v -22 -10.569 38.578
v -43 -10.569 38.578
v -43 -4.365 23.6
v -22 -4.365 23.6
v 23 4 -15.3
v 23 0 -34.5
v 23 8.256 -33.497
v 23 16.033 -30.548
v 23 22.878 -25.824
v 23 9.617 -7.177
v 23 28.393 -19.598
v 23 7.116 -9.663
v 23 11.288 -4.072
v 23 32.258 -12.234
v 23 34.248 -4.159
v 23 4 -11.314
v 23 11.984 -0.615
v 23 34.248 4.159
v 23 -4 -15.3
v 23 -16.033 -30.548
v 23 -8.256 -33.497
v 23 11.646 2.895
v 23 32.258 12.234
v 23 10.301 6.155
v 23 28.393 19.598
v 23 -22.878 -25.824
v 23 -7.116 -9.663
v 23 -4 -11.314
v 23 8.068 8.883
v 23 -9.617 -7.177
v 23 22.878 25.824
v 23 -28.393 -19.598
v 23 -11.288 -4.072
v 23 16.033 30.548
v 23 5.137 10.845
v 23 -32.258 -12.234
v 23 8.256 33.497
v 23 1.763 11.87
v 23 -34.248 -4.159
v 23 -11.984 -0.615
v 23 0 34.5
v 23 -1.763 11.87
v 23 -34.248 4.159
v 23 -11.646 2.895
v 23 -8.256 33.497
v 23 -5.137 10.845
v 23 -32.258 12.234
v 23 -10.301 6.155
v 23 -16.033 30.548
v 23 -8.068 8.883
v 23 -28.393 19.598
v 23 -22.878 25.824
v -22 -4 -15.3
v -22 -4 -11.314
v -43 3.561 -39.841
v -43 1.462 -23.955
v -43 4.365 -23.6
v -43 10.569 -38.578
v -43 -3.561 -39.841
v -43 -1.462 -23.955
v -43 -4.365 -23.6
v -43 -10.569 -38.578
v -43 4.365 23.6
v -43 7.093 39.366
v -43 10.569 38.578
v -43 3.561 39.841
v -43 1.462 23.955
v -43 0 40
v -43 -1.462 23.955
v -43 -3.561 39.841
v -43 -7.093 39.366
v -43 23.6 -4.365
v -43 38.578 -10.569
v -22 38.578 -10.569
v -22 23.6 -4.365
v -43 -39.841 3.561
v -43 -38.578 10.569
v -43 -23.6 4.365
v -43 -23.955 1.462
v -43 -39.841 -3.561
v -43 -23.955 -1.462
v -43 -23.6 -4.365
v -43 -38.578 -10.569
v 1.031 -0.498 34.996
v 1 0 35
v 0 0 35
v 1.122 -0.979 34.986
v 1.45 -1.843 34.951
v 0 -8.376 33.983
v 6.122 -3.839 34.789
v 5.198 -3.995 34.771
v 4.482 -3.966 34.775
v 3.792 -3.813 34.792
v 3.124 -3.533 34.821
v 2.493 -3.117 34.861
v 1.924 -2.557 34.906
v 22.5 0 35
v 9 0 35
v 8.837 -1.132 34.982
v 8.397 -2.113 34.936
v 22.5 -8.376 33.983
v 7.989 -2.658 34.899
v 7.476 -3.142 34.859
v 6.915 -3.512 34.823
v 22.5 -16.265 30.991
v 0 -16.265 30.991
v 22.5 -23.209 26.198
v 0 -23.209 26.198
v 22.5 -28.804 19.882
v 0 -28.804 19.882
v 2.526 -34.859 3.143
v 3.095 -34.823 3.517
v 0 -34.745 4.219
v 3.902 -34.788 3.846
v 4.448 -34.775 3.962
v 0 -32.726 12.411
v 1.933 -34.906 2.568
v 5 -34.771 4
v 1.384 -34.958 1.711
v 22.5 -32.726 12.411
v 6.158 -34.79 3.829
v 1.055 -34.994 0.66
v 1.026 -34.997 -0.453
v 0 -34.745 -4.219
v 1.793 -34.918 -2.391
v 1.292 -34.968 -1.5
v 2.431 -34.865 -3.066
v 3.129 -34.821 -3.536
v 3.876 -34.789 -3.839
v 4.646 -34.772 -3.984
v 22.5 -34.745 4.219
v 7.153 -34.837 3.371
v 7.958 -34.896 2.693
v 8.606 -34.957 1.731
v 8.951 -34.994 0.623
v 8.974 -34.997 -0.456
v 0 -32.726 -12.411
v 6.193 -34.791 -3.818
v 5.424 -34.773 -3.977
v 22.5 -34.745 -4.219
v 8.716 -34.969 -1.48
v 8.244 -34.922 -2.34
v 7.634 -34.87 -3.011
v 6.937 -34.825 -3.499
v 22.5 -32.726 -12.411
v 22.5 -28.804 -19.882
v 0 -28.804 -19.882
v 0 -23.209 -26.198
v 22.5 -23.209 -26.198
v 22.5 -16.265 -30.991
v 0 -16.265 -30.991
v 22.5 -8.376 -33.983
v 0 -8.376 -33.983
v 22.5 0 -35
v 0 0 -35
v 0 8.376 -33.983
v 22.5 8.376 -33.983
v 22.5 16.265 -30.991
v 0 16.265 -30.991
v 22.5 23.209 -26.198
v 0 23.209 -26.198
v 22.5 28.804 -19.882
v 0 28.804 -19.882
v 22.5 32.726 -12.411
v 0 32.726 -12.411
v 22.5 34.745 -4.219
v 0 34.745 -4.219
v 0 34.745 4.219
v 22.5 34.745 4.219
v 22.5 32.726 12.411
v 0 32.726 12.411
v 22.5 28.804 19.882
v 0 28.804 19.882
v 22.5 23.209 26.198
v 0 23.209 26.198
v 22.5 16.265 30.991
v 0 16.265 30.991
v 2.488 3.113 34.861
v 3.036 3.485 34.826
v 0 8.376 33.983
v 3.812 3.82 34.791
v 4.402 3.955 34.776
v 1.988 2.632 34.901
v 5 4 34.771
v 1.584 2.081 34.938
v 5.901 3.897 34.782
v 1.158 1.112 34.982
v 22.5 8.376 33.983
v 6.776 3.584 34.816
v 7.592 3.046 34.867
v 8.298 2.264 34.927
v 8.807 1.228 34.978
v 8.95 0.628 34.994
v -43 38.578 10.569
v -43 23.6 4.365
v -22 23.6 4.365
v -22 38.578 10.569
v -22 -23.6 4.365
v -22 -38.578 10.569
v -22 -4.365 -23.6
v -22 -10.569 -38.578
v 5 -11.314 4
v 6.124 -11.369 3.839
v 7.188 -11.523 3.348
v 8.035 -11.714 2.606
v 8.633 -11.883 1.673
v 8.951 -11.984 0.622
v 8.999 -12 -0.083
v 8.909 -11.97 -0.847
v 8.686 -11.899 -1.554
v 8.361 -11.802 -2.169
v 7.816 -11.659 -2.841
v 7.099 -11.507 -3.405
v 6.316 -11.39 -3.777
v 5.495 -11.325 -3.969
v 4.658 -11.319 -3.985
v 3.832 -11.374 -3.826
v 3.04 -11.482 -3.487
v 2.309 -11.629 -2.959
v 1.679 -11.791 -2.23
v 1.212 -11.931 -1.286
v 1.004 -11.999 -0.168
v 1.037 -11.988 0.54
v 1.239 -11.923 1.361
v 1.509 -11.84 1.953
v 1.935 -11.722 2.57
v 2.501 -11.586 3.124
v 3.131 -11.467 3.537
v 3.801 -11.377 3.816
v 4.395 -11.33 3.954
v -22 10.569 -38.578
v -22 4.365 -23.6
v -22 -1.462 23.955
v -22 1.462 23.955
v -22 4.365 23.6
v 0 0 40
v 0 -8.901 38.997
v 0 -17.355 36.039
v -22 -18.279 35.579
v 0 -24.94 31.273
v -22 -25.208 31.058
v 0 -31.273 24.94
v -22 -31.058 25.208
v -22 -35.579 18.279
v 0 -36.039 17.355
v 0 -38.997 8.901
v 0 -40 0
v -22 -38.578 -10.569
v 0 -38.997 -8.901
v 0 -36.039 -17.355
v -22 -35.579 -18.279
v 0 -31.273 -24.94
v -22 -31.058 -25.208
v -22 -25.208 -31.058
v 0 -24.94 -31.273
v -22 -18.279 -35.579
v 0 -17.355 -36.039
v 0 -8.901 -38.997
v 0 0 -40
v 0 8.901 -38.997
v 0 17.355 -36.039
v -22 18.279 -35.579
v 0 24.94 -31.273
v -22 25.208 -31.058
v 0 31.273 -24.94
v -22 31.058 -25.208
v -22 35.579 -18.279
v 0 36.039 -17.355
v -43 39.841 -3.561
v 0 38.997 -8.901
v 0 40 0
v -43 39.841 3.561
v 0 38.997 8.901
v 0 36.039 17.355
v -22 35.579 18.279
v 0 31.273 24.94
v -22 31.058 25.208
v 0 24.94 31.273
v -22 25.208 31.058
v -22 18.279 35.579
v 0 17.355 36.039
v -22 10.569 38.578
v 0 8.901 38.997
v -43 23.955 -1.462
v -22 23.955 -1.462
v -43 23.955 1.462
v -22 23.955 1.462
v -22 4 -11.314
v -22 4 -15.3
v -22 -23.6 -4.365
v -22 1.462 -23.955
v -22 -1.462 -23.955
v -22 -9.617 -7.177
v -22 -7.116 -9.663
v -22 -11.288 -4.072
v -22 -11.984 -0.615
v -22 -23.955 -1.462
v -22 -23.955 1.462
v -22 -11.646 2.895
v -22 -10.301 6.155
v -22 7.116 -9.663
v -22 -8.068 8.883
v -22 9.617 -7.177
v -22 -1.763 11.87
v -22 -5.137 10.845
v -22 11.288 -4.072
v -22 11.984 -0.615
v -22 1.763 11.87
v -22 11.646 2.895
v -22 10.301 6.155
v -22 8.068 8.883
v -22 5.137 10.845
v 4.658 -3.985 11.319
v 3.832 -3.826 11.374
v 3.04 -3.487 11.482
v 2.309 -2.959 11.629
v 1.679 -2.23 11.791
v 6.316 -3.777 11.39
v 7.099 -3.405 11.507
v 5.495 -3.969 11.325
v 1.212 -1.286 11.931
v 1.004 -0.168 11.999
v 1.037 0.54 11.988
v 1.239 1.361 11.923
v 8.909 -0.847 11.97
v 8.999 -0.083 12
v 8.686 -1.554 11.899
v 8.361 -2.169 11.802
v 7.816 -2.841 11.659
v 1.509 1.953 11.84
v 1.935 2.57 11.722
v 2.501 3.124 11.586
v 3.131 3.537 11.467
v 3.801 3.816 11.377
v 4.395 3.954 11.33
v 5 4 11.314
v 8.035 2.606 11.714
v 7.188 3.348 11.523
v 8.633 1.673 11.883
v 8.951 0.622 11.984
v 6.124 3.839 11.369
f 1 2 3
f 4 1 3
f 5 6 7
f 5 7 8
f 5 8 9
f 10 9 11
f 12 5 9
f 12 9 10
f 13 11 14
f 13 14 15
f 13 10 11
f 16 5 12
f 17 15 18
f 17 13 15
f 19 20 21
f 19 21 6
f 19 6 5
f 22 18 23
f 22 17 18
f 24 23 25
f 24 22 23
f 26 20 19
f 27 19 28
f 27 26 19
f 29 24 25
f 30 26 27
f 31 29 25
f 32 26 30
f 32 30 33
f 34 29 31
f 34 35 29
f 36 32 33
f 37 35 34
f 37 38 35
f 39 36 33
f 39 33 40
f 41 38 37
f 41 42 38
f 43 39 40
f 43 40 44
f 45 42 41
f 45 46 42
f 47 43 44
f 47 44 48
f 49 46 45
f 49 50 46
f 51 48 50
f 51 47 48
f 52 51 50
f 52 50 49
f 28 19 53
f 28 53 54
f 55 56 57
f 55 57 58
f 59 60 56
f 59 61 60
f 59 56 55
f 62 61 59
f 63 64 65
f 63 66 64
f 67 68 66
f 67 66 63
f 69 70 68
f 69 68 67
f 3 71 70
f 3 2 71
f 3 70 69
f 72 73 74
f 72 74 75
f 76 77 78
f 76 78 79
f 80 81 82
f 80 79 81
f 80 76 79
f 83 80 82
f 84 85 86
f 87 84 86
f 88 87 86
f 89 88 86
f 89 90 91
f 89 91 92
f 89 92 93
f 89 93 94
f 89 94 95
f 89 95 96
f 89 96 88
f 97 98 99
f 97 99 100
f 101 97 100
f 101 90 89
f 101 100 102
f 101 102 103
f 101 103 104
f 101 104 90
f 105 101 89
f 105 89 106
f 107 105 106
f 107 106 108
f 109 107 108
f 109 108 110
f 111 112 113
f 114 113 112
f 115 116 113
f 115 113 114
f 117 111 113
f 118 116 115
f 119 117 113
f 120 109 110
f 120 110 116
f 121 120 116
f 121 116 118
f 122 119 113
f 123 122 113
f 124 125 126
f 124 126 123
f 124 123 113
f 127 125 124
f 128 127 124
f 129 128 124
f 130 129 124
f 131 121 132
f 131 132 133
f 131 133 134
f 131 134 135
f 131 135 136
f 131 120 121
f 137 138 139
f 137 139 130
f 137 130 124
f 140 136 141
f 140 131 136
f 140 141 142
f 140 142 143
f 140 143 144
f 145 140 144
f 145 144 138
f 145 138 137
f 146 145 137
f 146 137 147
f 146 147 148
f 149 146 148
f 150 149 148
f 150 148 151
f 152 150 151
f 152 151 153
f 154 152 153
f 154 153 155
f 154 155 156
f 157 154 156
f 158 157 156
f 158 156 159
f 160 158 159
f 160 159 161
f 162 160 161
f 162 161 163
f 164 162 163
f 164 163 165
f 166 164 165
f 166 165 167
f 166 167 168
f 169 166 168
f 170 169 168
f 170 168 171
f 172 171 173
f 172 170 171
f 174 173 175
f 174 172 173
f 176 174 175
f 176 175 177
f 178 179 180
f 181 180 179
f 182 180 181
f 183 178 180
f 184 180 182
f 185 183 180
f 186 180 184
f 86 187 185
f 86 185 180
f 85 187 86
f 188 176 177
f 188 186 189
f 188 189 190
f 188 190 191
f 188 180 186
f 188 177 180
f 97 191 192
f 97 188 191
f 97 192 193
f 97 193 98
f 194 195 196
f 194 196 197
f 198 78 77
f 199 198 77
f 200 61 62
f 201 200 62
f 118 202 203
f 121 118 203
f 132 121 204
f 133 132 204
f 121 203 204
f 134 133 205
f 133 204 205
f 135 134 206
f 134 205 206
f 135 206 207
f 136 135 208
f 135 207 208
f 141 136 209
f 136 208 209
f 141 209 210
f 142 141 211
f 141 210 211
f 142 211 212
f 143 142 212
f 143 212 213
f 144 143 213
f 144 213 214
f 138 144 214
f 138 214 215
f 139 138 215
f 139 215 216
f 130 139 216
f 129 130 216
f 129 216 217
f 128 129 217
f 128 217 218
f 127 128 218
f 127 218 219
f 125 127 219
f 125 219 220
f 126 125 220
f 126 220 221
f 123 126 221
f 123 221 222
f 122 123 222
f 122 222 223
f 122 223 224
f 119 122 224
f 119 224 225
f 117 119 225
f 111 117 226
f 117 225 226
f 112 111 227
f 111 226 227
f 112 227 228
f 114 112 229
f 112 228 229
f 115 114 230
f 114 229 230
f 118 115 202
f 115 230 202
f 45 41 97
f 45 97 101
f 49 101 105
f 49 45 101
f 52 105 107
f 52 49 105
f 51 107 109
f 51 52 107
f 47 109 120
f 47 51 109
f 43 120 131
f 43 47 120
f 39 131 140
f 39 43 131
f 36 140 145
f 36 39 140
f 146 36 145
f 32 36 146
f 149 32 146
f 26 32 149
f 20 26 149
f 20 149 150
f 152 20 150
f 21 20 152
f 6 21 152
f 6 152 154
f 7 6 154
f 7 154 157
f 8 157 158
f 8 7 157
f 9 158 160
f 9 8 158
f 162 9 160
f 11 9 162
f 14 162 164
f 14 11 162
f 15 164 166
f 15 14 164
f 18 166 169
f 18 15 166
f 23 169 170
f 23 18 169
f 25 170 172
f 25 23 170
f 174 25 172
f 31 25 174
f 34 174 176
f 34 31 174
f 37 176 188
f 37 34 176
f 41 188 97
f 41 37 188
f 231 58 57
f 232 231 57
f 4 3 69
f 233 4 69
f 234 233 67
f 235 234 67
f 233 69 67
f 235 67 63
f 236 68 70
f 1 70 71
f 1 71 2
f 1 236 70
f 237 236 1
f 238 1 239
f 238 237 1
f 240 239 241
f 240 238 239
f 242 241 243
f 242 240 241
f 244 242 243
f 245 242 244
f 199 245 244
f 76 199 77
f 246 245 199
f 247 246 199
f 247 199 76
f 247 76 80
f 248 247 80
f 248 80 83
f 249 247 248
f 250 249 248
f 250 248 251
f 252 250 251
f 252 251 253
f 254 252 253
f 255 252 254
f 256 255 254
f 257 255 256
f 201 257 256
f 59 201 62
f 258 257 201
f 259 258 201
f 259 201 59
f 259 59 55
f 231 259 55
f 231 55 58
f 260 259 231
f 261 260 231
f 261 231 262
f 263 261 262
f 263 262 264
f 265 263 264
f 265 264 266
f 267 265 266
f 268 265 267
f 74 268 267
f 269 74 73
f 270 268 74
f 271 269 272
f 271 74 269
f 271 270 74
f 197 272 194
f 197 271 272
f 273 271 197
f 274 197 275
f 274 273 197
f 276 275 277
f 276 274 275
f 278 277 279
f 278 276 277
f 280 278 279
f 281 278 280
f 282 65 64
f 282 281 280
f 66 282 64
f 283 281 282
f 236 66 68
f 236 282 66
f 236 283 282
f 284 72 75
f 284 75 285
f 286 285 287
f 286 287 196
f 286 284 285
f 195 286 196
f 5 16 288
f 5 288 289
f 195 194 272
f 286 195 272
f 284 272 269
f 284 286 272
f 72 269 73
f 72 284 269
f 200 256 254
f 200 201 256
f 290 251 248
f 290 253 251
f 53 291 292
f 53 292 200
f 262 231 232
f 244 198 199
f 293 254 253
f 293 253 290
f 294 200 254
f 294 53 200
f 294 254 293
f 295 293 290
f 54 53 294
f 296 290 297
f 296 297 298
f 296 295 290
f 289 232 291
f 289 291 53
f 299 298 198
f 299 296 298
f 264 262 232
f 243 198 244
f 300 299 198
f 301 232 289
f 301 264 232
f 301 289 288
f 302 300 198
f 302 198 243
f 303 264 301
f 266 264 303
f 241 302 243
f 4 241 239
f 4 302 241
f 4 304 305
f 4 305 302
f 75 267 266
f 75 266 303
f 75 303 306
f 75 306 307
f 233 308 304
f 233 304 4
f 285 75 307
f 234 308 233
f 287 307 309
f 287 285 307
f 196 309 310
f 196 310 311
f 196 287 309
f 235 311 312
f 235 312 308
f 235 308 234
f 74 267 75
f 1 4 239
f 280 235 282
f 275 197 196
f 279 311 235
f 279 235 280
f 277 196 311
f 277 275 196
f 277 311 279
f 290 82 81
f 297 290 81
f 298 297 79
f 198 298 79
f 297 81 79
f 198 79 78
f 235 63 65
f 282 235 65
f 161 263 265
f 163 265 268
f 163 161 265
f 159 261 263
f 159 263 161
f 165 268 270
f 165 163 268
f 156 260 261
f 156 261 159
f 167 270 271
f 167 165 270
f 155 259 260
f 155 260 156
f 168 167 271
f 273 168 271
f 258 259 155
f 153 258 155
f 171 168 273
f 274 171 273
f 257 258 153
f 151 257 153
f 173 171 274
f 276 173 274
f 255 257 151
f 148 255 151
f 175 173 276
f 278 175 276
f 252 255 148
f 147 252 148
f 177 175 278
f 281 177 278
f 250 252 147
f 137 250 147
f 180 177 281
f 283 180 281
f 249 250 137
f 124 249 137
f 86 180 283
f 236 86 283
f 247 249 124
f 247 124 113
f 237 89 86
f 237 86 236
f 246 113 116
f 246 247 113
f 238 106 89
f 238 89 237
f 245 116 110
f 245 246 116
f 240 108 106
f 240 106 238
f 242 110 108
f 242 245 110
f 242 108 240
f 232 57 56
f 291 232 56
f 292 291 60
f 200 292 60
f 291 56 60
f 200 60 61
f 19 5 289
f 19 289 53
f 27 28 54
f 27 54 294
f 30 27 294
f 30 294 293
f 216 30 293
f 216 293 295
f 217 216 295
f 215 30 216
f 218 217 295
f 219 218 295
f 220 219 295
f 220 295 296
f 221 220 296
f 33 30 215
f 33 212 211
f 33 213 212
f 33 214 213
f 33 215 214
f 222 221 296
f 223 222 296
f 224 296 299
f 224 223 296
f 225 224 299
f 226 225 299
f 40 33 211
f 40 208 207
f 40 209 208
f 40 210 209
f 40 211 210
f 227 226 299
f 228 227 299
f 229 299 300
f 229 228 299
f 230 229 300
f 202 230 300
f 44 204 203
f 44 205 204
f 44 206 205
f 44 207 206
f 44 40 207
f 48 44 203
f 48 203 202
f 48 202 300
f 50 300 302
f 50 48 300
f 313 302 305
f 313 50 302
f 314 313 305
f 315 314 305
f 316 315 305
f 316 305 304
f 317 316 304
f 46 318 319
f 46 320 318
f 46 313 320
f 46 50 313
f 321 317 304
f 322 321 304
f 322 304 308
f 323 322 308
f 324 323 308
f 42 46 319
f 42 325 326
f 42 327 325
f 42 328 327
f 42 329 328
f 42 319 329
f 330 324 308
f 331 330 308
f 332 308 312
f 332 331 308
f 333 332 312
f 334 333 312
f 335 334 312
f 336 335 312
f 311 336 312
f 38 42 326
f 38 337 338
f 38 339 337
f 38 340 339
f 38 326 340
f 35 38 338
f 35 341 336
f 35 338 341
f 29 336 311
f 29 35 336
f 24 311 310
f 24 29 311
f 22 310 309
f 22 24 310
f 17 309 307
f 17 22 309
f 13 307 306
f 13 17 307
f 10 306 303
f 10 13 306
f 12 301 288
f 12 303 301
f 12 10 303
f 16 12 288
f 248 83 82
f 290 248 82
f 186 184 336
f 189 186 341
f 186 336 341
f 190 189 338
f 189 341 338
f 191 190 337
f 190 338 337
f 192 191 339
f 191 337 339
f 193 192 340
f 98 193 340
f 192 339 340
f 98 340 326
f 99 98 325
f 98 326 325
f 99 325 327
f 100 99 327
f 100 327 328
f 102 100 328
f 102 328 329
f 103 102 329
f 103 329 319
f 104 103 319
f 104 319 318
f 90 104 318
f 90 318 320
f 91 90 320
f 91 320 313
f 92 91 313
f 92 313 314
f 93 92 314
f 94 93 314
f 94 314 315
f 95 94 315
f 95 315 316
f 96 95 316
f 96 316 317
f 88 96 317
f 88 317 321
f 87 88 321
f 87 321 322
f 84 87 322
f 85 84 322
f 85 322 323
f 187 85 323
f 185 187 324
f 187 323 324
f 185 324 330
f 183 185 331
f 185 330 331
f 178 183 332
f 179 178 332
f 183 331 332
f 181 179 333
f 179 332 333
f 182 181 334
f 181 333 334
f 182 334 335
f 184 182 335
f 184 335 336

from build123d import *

# Parameters (mm, degrees)
CHAMFER1_SIZE           = 0.5
SKETCH2_OUTSIDE_W       = 108.196
SKETCH2_OUTSIDE_H       = 108.196
CUT_EXTRUDE1_DEPTH      = 21
CUT_EXTRUDE2_DEPTH      = 72.056315694
CUT_EXTRUDE2_DEPTH_BACK = 72.056315694
SKETCH6_R               = 4
CUT_EXTRUDE3_DEPTH      = 72.056315694
CIRPATTERN1_COUNT       = 2
CIRPATTERN1_ANGLE       = 90


with BuildPart() as part:
    # Sketch1 → Revolve1 (revolve)
    with BuildSketch(Plane.XY, mode=Mode.PRIVATE) as revolve1_sk:
        Polygon((-43, 40), (0, 40), (0, 35), (23, 35), (23, 0), (-43, 0), align=None)
    revolve(revolve1_sk.sketch.rotate(Axis((-50.16, 0, 0), (1, 0, 0)), 90), axis=Axis((-50.16, 0, 0), (1, 0, 0)))

    # Chamfer1
    chamfer1_edges = [part.edges().sort_by_distance(p)[0] for p in [
        (23, 0, -35),
    ]]
    chamfer(chamfer1_edges, length=CHAMFER1_SIZE)

    # Sketch2 outside → Cut-Extrude1 (cut)
    with BuildSketch(Plane.ZY.offset(43)):
        Rectangle(SKETCH2_OUTSIDE_W, SKETCH2_OUTSIDE_H)
        with BuildLine():
            Line((38.578346676, -10.569350395), (23.599719808, -4.365))
            ThreePointArc((23.599719808, -4.365), (24, 0), (23.599719808, 4.365))
            Line((23.599719808, 4.365), (38.578346676, 10.569350395))
            ThreePointArc((38.578346676, 10.569350395), (40, 0), (38.578346676, -10.569350395))
        make_face(mode=Mode.SUBTRACT)
        with BuildLine():
            Line((-10.569350395, 38.578346676), (-4.365, 23.599719808))
            ThreePointArc((-4.365, 23.599719808), (0, 24), (4.365, 23.599719808))
            Line((4.365, 23.599719808), (10.569350395, 38.578346676))
            ThreePointArc((10.569350395, 38.578346676), (0, 40), (-10.569350395, 38.578346676))
        make_face(mode=Mode.SUBTRACT)
        with BuildLine():
            Line((-10.569350395, -38.578346676), (-4.365, -23.599719808))
            ThreePointArc((-4.365, -23.599719808), (0, -24), (4.365, -23.599719808))
            Line((4.365, -23.599719808), (10.569350395, -38.578346676))
            ThreePointArc((10.569350395, -38.578346676), (0, -40), (-10.569350395, -38.578346676))
        make_face(mode=Mode.SUBTRACT)
        with BuildLine():
            Line((-38.578346676, 10.569350395), (-23.599719808, 4.365))
            ThreePointArc((-23.599719808, 4.365), (-24, 0), (-23.599719808, -4.365))
            Line((-23.599719808, -4.365), (-38.578346676, -10.569350395))
            ThreePointArc((-38.578346676, -10.569350395), (-40, 0), (-38.578346676, 10.569350395))
        make_face(mode=Mode.SUBTRACT)
    extrude(amount=-CUT_EXTRUDE1_DEPTH, mode=Mode.SUBTRACT)

    # Sketch4 → Cut-Extrude2 (cut, two sides: drawn at the far end of the back side and taken through both)
    with BuildSketch(Plane.ZY.offset(-CUT_EXTRUDE2_DEPTH_BACK)):
        with BuildLine():
            Line((-15.3, -4), (-11.313708499, -4))
            ThreePointArc((-11.313708499, -4), (12, 0), (-11.313708499, 4))
            Line((-11.313708499, 4), (-15.3, 4))
            Line((-15.3, 4), (-15.3, -4))
        make_face()
    extrude(amount=CUT_EXTRUDE2_DEPTH + CUT_EXTRUDE2_DEPTH_BACK, mode=Mode.SUBTRACT)

    # Sketch6 → Cut-Extrude3 (cut, through all)
    with BuildSketch(Plane(origin=(0, 0, 0), x_dir=(1, 0, 0), z_dir=(0, 1, 0))):
        with Locations(Location((5, 0, 0), (0, 0, 270))):
            Circle(SKETCH6_R)
    cut_extrude3 = extrude(amount=-CUT_EXTRUDE3_DEPTH, mode=Mode.SUBTRACT)

    # CirPattern1: Cut-Extrude3 ×2 about axis
    cirpattern1_axis = Axis((0, 0, 0), (-1, 0, 0))
    for i in range(1, CIRPATTERN1_COUNT):
        add(cut_extrude3.rotate(cirpattern1_axis, i * CIRPATTERN1_ANGLE / (CIRPATTERN1_COUNT - 1)), mode=Mode.SUBTRACT)


solid = part.part
